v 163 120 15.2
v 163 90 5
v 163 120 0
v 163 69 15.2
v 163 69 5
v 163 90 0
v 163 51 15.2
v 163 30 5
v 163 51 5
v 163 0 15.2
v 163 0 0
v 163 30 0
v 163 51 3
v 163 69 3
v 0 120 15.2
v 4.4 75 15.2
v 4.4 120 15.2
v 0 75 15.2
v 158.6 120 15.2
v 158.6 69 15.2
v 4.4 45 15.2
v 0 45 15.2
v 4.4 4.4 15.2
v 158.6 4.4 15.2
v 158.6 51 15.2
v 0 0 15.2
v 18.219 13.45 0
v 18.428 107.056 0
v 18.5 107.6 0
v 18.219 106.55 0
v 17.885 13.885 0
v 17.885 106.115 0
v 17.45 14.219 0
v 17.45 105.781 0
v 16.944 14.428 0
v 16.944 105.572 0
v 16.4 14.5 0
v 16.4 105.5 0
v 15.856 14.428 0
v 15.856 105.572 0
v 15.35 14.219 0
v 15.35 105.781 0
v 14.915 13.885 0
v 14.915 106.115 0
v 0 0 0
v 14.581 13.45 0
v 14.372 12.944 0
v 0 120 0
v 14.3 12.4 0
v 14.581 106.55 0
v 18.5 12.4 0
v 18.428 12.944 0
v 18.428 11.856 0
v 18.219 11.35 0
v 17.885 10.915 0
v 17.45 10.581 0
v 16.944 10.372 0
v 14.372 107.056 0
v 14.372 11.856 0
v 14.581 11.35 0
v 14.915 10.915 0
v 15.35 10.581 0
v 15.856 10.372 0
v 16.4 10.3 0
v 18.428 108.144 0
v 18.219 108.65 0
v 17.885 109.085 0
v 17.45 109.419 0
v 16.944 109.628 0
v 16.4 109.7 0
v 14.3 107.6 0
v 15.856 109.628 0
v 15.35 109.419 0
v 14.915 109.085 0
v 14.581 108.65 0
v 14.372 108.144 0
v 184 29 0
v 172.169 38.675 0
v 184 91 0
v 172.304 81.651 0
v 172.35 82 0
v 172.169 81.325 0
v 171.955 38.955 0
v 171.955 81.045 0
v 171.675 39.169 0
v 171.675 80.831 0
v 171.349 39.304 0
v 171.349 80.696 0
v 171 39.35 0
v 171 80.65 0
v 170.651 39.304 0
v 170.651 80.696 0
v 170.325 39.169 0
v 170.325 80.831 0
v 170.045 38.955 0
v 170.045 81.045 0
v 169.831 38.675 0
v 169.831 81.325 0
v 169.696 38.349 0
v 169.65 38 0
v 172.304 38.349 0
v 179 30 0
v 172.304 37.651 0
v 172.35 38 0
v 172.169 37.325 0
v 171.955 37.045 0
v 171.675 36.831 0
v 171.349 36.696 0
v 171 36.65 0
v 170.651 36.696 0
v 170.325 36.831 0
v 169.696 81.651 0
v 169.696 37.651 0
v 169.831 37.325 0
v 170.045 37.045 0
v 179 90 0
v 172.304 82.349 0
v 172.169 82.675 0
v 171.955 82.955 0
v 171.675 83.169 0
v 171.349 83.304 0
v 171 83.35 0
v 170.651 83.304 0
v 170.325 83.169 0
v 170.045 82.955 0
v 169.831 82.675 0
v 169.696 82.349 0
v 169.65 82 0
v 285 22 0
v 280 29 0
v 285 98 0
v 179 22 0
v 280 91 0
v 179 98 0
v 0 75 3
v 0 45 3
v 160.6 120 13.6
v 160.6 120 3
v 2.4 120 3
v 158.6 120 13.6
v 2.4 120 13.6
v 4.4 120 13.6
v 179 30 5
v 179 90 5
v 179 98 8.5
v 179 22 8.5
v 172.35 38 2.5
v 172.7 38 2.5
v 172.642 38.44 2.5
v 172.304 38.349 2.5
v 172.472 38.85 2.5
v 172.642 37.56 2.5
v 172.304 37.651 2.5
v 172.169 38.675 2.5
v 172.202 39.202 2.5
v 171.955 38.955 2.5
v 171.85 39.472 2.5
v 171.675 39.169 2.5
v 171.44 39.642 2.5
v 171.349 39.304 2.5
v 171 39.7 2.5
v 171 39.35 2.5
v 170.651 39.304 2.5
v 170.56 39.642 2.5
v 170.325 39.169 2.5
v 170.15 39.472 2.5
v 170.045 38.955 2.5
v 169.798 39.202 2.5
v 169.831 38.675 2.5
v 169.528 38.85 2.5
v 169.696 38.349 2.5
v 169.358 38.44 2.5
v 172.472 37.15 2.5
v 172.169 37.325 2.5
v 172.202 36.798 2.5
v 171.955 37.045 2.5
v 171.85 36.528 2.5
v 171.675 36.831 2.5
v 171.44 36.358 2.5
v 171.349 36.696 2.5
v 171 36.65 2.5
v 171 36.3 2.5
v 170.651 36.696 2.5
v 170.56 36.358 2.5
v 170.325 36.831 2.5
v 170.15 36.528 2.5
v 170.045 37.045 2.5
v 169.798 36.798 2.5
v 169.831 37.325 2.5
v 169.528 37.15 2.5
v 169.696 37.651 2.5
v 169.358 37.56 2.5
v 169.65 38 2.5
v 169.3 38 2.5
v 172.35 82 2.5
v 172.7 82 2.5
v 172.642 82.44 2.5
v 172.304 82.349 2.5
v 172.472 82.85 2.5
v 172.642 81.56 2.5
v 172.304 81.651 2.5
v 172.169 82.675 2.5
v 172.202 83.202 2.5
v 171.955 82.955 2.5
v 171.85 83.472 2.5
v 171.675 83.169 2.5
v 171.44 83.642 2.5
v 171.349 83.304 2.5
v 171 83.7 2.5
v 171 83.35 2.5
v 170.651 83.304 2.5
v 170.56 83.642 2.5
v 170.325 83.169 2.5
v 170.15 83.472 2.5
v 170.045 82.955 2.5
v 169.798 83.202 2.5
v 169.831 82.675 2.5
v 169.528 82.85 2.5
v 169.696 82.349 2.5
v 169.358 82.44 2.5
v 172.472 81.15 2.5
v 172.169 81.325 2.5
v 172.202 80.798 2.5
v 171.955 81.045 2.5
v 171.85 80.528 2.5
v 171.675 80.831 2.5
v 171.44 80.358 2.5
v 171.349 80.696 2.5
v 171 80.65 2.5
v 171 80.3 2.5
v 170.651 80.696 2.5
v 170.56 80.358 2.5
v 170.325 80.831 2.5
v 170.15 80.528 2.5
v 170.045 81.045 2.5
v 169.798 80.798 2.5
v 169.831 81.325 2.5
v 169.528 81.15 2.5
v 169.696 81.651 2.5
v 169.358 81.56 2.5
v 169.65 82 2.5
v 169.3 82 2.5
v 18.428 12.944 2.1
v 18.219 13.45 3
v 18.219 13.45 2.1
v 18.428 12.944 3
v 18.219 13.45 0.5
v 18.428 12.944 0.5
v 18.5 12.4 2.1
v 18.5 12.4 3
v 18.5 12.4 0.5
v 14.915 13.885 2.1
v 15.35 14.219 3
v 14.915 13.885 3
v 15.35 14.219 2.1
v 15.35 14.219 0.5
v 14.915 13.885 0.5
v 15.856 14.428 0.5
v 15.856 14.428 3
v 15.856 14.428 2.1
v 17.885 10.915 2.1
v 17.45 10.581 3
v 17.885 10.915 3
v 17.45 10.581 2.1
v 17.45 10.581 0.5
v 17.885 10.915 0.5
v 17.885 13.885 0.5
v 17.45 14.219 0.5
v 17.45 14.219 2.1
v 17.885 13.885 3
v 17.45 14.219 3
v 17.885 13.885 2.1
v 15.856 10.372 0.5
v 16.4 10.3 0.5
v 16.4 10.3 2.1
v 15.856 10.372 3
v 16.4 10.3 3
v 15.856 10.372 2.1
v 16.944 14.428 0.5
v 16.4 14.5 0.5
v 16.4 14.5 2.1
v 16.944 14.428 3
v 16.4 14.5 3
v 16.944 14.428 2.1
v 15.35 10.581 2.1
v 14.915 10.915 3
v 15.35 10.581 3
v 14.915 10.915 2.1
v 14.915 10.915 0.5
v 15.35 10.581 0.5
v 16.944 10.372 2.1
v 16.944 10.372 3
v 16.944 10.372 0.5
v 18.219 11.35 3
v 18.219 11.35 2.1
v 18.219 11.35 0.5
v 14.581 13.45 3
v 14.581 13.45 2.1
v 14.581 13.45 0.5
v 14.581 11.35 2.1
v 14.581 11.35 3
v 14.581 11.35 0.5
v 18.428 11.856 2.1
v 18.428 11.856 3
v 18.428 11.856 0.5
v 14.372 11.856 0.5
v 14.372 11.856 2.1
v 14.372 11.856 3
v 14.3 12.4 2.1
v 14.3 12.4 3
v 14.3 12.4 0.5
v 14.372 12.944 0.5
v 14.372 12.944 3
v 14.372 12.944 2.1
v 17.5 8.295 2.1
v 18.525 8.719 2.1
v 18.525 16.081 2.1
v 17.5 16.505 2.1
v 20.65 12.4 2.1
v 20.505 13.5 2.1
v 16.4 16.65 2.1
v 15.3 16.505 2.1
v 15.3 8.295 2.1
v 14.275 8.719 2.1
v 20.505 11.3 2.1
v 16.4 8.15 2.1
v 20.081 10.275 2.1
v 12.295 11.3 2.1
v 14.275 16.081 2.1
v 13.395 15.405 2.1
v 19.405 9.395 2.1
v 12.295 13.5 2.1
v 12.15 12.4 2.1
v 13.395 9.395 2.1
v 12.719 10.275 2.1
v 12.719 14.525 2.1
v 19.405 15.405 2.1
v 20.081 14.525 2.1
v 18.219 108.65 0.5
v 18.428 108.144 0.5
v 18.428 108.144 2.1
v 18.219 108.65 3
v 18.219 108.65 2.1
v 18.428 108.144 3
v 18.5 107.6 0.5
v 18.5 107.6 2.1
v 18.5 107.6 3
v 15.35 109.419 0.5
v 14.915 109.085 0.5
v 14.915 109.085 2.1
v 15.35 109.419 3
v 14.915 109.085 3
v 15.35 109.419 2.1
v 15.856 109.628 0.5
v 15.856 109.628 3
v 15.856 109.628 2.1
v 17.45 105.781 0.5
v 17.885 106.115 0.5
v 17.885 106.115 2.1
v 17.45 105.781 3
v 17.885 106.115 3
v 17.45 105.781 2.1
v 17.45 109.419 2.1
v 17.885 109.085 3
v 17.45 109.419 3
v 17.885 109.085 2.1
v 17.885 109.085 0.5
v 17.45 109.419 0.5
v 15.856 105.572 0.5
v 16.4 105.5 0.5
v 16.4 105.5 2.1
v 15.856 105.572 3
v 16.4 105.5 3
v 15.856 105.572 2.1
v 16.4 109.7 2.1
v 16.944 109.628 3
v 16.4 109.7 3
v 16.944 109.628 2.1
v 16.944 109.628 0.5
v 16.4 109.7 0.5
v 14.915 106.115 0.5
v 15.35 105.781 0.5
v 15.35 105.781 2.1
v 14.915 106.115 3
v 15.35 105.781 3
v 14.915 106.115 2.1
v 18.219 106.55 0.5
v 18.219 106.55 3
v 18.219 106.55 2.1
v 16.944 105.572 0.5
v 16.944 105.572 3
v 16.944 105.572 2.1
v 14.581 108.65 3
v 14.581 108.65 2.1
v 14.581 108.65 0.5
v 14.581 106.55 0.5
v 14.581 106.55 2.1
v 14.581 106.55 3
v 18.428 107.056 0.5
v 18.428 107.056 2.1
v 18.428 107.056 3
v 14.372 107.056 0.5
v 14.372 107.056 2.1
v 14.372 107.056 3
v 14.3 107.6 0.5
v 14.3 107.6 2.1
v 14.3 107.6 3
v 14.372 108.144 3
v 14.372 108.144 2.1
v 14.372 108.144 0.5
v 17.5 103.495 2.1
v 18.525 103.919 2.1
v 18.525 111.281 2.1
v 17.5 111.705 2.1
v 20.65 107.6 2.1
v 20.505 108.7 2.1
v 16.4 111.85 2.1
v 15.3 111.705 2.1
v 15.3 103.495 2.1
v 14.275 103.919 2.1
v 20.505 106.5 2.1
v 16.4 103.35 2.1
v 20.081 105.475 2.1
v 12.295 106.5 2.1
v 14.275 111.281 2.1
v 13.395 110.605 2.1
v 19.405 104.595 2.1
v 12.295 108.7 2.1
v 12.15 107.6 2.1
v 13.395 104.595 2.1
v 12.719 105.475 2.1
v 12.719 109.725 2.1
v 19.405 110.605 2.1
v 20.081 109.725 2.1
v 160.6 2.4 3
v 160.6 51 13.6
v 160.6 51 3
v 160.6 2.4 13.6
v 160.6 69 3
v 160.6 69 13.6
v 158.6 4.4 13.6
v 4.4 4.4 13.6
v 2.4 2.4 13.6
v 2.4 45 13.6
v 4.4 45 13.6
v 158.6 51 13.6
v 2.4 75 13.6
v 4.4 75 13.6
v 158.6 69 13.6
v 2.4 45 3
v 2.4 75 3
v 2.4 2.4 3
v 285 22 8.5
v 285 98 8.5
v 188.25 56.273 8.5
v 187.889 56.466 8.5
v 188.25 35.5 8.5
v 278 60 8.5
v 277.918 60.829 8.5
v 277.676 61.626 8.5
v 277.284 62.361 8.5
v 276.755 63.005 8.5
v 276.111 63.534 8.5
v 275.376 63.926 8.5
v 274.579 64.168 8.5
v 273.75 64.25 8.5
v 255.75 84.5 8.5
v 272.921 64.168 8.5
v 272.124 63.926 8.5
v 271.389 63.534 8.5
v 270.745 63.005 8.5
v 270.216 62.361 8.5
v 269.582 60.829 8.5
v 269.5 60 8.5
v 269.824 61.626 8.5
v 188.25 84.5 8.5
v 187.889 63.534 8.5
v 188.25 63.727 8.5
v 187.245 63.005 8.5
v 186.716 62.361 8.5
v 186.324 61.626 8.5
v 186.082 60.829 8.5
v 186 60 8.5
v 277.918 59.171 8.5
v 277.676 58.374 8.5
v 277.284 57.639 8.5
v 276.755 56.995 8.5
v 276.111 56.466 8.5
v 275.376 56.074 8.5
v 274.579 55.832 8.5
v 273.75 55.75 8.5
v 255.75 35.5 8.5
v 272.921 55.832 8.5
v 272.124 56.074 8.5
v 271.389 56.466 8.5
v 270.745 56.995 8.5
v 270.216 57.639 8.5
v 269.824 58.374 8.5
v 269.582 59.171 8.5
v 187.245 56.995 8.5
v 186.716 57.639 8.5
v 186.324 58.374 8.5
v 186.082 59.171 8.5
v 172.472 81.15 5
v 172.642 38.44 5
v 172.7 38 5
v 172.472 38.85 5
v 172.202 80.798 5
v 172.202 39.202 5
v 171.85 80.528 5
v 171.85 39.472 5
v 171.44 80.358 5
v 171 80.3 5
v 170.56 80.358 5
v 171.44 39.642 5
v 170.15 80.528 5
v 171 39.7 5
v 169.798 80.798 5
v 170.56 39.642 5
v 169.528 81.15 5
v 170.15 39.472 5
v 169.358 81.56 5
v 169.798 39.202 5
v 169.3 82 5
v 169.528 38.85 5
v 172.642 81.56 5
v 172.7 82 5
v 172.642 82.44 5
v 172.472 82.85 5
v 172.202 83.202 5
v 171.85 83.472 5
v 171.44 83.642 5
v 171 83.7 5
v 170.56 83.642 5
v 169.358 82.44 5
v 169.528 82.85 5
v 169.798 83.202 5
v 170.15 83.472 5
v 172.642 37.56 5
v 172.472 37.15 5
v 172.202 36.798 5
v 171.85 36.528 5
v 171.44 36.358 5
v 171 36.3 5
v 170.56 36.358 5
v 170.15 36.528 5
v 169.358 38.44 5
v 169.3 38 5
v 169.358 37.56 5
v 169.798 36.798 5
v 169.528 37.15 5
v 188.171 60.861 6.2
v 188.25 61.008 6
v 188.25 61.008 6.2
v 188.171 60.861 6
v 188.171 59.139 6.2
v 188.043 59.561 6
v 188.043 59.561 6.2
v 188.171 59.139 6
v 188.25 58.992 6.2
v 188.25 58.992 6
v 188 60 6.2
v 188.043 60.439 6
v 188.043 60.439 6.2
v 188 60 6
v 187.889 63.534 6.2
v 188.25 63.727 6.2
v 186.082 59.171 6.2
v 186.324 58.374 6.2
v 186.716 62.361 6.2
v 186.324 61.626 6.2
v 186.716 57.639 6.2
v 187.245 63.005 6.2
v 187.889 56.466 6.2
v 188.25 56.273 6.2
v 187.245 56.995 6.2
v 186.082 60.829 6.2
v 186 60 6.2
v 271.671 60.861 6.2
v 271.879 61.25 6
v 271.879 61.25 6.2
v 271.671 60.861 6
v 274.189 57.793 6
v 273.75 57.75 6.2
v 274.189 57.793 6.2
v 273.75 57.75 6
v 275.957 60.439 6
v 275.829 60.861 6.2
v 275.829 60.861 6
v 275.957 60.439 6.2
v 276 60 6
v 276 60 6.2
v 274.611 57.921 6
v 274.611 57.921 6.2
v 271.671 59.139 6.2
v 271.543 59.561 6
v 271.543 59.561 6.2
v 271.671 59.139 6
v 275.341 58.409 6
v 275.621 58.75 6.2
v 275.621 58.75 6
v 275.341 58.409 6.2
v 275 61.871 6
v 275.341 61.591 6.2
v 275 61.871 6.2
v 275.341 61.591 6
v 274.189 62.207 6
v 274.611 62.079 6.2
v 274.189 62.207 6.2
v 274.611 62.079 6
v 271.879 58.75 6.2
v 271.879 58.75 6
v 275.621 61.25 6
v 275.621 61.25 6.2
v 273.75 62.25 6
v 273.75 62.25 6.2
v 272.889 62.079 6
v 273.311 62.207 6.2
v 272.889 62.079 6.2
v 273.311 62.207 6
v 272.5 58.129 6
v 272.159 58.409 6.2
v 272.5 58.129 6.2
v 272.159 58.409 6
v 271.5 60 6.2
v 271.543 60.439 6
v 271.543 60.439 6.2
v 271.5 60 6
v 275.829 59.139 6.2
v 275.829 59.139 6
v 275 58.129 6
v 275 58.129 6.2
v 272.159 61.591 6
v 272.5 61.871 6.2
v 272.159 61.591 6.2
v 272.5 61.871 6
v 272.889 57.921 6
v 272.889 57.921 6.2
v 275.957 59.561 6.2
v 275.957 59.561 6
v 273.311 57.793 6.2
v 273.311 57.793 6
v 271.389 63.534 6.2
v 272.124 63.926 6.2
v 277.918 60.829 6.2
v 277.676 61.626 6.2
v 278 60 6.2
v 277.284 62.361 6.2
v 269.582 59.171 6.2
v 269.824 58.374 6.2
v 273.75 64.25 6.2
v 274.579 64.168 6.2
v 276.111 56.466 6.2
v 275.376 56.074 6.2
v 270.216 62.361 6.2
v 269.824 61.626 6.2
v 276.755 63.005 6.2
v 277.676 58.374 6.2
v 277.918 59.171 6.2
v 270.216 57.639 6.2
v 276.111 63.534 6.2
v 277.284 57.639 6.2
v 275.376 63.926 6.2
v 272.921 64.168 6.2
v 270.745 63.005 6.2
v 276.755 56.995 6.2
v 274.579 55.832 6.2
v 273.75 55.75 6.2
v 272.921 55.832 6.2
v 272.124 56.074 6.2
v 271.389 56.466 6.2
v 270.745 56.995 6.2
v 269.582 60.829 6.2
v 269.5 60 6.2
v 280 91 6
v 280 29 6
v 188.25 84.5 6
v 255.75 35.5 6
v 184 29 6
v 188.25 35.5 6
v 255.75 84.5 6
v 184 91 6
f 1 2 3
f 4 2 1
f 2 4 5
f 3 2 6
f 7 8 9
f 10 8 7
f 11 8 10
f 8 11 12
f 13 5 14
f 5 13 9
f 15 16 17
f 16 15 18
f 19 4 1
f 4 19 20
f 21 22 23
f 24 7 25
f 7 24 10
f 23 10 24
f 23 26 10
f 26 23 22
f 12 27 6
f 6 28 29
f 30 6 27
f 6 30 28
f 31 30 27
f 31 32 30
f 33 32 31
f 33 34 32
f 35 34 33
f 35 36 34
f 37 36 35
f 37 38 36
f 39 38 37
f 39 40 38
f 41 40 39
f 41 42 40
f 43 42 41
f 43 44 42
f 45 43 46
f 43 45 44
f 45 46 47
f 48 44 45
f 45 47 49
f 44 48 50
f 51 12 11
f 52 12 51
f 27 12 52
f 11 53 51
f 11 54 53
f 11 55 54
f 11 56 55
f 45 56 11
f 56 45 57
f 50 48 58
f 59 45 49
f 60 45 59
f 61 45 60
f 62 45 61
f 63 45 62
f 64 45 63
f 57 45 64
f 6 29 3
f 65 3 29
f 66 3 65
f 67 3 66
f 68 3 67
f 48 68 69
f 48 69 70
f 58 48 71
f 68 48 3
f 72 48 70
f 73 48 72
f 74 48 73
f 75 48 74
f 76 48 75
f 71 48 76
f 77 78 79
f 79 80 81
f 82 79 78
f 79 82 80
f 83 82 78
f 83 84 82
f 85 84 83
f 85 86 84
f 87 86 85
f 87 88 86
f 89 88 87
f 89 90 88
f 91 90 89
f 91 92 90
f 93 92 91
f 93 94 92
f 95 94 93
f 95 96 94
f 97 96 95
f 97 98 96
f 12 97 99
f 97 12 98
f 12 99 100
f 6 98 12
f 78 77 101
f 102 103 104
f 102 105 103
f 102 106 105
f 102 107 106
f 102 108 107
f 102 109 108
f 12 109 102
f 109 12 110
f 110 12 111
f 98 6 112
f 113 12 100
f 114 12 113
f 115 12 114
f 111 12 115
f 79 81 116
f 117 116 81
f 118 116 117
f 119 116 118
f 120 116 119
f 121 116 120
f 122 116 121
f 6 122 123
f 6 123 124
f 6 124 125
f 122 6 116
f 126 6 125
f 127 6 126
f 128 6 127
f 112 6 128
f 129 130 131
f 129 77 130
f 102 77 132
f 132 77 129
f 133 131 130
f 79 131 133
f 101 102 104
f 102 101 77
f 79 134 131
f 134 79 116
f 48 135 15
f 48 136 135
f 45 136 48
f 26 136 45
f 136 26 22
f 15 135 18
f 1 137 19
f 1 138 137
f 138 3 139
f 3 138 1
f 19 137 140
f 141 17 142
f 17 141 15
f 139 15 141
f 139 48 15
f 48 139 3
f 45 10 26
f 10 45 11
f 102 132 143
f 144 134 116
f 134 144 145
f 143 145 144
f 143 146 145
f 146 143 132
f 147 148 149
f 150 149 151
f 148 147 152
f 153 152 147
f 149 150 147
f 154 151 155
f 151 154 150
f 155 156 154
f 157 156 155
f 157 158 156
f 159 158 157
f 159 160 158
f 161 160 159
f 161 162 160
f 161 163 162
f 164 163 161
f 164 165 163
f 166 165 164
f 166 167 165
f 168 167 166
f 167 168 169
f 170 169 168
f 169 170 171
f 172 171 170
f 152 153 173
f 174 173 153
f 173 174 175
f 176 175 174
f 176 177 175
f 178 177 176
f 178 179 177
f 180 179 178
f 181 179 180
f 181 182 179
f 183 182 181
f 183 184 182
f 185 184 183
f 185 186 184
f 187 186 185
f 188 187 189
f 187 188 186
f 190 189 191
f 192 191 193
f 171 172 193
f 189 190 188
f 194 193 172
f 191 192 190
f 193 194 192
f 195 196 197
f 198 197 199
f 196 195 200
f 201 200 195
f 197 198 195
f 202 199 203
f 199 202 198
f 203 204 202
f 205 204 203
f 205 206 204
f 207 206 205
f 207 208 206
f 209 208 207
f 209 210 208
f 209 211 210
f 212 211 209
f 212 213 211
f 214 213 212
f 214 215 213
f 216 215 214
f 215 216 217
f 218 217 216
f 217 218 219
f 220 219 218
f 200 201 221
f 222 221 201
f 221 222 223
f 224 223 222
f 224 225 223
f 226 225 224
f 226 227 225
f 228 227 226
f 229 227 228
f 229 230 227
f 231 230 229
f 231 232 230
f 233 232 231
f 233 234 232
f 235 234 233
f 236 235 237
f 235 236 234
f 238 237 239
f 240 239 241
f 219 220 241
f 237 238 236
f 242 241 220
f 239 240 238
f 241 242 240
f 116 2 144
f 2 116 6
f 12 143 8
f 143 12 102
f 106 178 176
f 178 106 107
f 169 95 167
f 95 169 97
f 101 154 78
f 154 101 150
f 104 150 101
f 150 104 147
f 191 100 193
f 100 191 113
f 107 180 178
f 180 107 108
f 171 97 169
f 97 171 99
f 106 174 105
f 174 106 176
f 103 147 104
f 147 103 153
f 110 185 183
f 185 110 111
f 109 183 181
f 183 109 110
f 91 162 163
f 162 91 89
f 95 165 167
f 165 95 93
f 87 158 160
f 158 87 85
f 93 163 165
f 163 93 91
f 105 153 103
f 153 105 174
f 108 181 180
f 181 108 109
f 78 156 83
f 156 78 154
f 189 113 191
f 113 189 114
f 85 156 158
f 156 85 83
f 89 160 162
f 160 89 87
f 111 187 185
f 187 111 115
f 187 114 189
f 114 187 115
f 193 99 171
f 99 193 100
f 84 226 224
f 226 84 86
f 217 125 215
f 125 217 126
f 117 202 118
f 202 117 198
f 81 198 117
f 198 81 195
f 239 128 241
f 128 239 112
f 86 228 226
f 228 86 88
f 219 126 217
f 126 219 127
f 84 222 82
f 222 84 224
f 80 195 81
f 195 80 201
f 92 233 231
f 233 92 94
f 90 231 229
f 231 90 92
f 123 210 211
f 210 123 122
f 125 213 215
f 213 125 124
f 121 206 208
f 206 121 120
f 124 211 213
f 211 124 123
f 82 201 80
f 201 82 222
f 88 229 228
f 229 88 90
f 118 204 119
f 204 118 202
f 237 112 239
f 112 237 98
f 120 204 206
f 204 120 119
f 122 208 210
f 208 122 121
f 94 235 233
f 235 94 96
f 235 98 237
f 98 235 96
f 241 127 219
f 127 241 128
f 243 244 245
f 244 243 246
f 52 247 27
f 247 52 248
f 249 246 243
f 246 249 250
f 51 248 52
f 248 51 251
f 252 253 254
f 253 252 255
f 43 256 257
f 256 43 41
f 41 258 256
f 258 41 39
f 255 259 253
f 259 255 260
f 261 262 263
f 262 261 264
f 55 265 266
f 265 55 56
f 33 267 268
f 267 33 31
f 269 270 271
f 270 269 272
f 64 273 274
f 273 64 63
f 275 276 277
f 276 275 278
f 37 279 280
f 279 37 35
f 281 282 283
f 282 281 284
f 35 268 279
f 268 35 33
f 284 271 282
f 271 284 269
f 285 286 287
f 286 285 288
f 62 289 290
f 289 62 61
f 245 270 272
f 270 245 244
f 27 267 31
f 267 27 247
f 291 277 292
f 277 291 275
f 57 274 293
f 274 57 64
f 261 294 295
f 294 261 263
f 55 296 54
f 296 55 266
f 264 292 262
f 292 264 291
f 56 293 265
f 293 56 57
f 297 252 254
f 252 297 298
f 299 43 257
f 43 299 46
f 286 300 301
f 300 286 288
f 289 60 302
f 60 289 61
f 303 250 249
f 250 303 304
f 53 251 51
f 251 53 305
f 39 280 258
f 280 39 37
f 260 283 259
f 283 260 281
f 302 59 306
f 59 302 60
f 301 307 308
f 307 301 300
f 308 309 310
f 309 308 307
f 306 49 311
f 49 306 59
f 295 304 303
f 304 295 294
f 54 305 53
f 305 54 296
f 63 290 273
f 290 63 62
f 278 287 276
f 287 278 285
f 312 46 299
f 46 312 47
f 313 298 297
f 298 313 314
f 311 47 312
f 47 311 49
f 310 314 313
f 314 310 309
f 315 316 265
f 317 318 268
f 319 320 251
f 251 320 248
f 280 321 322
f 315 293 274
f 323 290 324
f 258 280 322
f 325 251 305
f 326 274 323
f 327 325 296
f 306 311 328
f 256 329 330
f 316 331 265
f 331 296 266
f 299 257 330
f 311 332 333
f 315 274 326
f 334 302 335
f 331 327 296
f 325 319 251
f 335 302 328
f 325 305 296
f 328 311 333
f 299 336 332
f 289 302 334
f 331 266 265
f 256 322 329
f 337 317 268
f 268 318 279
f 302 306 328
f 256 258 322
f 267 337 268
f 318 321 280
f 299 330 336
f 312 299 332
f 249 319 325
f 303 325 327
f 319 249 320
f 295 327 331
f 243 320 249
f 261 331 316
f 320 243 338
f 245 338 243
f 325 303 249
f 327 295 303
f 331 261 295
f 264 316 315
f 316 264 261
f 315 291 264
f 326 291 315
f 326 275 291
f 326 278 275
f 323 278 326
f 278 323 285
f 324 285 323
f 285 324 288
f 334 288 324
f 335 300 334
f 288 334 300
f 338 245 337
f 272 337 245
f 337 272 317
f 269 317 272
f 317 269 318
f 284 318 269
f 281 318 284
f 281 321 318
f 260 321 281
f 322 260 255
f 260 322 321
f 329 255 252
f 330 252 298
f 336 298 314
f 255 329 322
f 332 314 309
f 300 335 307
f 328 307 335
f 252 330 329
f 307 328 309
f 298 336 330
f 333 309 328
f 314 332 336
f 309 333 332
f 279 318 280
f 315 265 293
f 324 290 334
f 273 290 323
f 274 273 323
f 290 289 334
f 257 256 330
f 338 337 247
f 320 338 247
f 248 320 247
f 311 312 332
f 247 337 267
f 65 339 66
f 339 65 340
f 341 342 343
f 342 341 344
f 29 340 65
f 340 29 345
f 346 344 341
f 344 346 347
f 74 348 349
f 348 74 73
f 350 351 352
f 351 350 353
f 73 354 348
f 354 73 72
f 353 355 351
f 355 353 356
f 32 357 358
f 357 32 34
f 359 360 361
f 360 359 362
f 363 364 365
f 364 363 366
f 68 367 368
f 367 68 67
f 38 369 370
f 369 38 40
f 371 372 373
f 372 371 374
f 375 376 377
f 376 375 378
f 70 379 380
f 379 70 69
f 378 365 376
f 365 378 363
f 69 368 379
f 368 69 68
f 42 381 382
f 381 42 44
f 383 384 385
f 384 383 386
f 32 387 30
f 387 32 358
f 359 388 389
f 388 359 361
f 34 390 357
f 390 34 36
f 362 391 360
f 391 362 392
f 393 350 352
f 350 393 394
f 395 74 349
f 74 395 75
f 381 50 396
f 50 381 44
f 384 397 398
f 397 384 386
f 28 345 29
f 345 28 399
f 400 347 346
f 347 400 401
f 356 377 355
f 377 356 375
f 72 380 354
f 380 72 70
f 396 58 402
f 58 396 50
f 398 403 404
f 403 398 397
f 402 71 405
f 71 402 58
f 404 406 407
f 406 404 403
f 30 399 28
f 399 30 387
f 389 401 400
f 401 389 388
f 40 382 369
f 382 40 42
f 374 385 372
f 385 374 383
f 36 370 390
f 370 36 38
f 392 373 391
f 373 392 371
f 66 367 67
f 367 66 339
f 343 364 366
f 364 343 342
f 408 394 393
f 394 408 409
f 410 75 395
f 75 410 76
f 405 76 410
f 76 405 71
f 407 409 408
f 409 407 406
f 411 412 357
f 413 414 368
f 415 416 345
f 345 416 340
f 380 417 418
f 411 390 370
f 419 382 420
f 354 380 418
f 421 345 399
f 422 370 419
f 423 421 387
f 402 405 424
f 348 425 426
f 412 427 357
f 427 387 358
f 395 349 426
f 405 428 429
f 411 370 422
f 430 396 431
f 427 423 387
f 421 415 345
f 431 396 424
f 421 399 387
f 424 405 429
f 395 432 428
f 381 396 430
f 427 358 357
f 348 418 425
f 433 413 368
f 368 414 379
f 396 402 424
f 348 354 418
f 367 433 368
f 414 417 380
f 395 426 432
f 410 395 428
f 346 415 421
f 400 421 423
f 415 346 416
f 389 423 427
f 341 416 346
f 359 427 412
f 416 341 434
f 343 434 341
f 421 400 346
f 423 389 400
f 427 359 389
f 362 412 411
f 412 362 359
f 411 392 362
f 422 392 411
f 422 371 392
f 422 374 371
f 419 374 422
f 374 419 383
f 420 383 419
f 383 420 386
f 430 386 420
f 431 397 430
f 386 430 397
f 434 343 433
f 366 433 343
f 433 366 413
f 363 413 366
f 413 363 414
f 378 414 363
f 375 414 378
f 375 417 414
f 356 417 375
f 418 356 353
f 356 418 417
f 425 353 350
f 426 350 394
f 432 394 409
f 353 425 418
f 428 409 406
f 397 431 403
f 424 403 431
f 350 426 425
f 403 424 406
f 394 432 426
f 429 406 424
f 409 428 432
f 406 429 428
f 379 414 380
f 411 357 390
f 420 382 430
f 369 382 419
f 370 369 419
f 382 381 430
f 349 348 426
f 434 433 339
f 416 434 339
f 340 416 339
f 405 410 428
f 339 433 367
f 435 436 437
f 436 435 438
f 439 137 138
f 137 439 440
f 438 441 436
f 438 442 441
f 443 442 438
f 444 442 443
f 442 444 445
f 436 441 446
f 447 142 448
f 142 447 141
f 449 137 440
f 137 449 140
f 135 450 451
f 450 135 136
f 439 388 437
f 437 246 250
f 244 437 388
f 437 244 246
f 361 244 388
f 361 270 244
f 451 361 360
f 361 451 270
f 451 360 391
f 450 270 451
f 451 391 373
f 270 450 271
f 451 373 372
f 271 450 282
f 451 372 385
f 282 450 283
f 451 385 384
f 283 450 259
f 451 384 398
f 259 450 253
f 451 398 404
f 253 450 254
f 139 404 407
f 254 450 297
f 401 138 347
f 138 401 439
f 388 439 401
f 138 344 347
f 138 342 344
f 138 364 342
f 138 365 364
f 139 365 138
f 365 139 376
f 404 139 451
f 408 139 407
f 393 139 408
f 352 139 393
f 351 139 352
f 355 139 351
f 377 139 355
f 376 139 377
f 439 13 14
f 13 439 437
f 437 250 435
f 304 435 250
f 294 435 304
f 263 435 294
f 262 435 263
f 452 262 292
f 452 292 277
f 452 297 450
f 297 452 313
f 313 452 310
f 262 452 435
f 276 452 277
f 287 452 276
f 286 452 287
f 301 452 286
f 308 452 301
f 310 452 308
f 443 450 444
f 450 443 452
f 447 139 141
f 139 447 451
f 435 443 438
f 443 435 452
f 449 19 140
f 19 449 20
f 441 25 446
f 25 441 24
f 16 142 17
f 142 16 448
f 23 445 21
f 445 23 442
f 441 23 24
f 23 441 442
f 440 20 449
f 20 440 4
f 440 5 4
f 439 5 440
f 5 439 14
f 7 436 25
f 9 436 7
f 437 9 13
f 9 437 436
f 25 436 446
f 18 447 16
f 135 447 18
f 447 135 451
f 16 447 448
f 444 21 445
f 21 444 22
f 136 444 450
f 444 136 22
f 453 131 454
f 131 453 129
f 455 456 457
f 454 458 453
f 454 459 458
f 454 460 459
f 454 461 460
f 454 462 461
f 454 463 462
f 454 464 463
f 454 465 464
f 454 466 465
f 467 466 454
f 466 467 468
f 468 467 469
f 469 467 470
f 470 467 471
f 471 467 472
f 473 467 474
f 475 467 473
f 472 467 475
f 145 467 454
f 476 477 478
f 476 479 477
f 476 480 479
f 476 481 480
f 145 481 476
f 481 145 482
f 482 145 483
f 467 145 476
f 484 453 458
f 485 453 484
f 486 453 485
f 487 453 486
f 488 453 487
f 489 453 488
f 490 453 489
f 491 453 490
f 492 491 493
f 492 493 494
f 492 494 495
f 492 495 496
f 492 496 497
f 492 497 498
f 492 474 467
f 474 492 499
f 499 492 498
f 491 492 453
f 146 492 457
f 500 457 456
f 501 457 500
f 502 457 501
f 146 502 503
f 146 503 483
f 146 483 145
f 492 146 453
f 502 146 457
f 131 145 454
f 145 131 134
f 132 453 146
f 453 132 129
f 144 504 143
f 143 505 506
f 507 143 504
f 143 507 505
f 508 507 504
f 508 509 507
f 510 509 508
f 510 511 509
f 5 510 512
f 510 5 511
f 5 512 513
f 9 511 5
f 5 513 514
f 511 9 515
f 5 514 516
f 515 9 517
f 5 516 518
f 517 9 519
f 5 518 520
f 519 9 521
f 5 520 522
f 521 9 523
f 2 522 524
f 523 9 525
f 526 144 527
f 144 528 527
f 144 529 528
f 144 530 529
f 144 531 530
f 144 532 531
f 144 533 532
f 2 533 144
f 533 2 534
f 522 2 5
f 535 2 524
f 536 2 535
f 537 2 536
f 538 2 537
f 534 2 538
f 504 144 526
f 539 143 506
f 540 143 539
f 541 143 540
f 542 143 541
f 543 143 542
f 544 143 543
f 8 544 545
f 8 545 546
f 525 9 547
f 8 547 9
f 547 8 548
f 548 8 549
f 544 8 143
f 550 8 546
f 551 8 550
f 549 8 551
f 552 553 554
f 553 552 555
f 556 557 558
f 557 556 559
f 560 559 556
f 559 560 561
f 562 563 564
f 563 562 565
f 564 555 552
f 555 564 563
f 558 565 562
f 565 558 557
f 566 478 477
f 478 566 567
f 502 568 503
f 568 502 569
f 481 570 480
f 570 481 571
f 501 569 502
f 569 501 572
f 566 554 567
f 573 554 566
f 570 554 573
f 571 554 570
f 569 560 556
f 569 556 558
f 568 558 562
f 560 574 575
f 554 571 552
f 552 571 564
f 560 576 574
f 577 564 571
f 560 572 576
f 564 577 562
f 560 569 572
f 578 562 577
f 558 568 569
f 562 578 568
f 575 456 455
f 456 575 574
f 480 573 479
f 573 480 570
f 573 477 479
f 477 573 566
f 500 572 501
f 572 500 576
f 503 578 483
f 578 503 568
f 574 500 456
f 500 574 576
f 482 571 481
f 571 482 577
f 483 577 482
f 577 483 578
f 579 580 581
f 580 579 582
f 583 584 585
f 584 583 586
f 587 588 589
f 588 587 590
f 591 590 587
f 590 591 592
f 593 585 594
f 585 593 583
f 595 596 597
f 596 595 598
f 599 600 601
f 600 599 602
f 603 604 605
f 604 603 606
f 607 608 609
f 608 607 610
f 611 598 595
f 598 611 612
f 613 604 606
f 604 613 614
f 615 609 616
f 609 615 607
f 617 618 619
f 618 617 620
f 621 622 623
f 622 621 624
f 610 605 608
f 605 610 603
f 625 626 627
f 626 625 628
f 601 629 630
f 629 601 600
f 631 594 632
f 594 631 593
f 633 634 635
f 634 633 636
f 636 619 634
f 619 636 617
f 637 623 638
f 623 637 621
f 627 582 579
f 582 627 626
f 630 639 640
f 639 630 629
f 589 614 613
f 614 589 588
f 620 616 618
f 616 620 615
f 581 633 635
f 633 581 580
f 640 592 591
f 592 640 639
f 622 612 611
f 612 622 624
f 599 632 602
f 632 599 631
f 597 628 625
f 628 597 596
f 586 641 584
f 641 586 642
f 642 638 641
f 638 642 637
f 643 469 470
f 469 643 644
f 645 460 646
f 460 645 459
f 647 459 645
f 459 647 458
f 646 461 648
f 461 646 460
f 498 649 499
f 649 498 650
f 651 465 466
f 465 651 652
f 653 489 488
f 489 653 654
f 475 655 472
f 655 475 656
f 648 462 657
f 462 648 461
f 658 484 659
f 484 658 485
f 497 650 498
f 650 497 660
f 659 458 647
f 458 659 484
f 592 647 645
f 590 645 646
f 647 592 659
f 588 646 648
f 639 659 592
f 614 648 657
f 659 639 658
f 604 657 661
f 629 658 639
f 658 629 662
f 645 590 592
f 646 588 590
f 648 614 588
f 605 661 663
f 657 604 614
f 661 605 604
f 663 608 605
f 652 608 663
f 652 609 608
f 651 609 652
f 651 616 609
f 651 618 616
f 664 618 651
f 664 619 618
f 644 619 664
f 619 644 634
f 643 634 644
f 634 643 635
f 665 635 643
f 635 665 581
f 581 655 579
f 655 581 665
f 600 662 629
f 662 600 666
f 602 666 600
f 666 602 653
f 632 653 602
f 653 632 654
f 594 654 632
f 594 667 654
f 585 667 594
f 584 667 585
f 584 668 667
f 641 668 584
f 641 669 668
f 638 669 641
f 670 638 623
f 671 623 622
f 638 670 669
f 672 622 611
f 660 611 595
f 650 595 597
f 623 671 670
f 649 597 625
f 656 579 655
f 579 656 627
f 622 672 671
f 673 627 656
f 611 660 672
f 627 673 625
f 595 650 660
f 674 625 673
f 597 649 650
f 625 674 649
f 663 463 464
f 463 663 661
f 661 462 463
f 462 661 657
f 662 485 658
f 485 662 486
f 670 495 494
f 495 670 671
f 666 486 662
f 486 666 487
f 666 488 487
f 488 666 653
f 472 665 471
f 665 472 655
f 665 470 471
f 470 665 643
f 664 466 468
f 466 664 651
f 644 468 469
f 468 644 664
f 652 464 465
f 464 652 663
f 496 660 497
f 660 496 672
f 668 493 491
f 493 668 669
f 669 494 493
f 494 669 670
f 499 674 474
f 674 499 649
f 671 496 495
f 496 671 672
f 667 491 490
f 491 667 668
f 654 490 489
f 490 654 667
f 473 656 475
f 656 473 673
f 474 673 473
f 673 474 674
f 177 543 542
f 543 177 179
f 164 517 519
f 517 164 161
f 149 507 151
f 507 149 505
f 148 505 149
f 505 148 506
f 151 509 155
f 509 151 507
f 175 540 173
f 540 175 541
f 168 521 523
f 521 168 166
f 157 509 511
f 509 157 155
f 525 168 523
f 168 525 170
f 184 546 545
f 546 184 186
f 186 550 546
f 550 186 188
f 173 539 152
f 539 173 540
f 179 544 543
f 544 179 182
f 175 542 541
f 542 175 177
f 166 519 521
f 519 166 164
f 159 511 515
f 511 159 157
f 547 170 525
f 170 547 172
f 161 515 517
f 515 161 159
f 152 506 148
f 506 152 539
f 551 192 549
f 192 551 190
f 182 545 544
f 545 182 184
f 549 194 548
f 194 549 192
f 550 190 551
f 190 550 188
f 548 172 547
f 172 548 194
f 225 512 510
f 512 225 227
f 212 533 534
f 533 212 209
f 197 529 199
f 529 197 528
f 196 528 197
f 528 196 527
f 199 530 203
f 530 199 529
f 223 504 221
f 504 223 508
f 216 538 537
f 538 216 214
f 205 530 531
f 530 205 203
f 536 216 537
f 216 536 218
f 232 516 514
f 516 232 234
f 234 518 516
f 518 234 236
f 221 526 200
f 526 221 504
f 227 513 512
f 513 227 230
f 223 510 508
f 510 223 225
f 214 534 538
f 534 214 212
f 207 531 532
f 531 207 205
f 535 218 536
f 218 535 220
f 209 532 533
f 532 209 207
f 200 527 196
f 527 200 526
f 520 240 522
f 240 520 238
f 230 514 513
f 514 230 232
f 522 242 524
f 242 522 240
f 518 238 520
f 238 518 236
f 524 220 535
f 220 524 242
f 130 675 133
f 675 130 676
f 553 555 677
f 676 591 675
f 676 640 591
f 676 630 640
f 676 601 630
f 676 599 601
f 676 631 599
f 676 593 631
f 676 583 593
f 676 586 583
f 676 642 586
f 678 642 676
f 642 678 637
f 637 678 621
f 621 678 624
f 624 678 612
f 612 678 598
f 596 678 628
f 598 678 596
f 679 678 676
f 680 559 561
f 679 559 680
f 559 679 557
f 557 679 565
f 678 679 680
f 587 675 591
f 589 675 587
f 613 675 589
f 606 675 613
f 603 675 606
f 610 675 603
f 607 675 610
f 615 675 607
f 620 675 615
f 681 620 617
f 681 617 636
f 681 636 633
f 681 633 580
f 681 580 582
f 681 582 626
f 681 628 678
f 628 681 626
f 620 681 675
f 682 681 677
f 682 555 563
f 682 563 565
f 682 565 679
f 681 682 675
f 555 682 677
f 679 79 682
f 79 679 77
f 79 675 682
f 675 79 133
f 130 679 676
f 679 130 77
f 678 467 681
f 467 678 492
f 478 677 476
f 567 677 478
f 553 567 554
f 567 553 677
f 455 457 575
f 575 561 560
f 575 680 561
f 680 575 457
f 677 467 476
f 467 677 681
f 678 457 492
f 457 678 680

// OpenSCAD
// Supporto a muro per Kobo Glo (N613) + adattatore per scatola 503 / BTicino Living Light
// Orientamento: landscape, micro-USB sul lato DESTRO, tasto power sul lato SINISTRO.
// Sistema di coordinate: x = destra, y = su, z = esce dal muro. Unità: mm.
//
// Due pezzi stampabili (ciascuno entra in un piatto 220x220):
//   tray()    = vano per il Kobo (aperto in alto: il Kobo si infila dall'alto)
//   adapter() = piastra che si avvita alla 503 sopra il supporto Living Light
// I due pezzi si uniscono con 2 viti M3x10 attraverso le linguette sovrapposte.
//
// !! Valori marcati [VERIFICARE] sono stime: misurali sul tuo hardware prima di stampare.

part = "assembly";   // "assembly" | "tray" | "adapter"

/* ---- Kobo Glo (fonti: MobileRead/Wikipedia 114 x 157 x 10) ---- */
kobo_w = 157;        // lato lungo (landscape)
kobo_h = 114;        // lato corto
kobo_t = 10;         // spessore
clr    = 0.6;        // gioco per lato
lip    = 2.0;        // sovrapposizione del bordo frontale: MAI di piu', sotto ci sono i sensori IR
usb_y     = 0;       // [VERIFICARE] offset verticale porta USB rispetto al centro (+ = su)
usb_w     = 18;      // larghezza apertura per spinotto (consigliato spinotto a 90 gradi)
power_y   = 0;       // [VERIFICARE] offset verticale tasto power rispetto al centro, lato sinistro
power_w   = 30;      // apertura per raggiungere il tasto

/* ---- Struttura ---- */
wall   = 2.4;        // pareti
back   = 3.0;        // fondo vano
lip_t  = 1.6;        // spessore del bordo frontale
tab_l  = 16;         // lunghezza linguette di unione
tab_t  = 2.5;        // spessore di ciascuna linguetta

/* ---- Scatola 503 / Living Light ---- */
hole_pitch = 83.5;   // interasse fori 503 (standard)
ad_w   = 106;        // [VERIFICARE] larghezza piastra adattatore
ad_h   = 76;         // [VERIFICARE] altezza piastra adattatore
sup_t  = 6;          // [VERIFICARE] spessore supporto Living Light che entra nella cava posteriore
sup_w  = 96;         // [VERIFICARE] ingombro supporto (cava posteriore)
sup_h  = 62;         // [VERIFICARE]
win_w  = 67.5;       // [VERIFICARE] finestra moduli (3 moduli)
win_h  = 49;         // [VERIFICARE]
win_dx = -10;        // spostamento finestra verso il Kobo (cavo corto)
screw_d = 4.5;       // asola per viti 503
head_d  = 8.5;

tw = kobo_w + 2*clr + 2*wall;
th = kobo_h + 2*clr + 2*wall;
pd = kobo_t + clr;
tdepth = back + pd + lip_t;
ad_t = sup_t + 2.5;

module tray() {
  difference() {
    union() {
      cube([tw, th, tdepth]);
      // linguetta di unione (lato muro)
      translate([tw, th/2-30, 0]) cube([tab_l, 60, tab_t]);
    }
    // vano Kobo, aperto in alto
    translate([wall, wall, back]) cube([kobo_w+2*clr, kobo_h+2*clr+wall+1, pd]);
    // finestra frontale (bordo che trattiene solo 'lip' mm)
    translate([wall+lip, wall+lip, back+pd-0.01]) cube([kobo_w+2*clr-2*lip, th, lip_t+1]);
    // apertura USB (destra) e tasto power (sinistra)
    translate([tw-wall-lip, th/2+usb_y-usb_w/2, back]) cube([wall+lip+1, usb_w, tdepth]);
    translate([-1, th/2+power_y-power_w/2, back]) cube([wall+lip+1, power_w, tdepth]);
    // viti M3 per unione
    for (s=[-1,1]) translate([tw+tab_l/2, th/2+s*22, -1]) cylinder(d=2.7, h=tab_t+2, $fn=24);
    // 2 fori opzionali per fissare il vano al muro (tassello)
    for (s=[-1,1]) translate([wall+14, th/2+s*(th/2-wall-10), -1]) {
      cylinder(d=4.2, h=back+2, $fn=24);
      translate([0,0,back-1.5]) cylinder(d1=4.2,d2=8.5,h=1.6,$fn=24);
    }
  }
}

module adapter() {
  difference() {
    union() {
      translate([tab_l, 0, 0]) cube([ad_w, ad_h, ad_t]);
      // linguetta sovrapposta (sopra quella del vano)
      translate([0, ad_h/2-30, tab_t]) cube([tab_l+1, 60, tab_t]);
    }
    // cava posteriore per il supporto Living Light
    translate([tab_l+(ad_w-sup_w)/2, (ad_h-sup_h)/2, -1]) cube([sup_w, sup_h, sup_t+1]);
    // finestra per i moduli
    translate([tab_l+(ad_w-win_w)/2+win_dx, (ad_h-win_h)/2, -1]) cube([win_w, win_h, ad_t+2]);
    // asole viti 503 con svasatura
    for (s=[-1,1]) translate([tab_l+ad_w/2+s*hole_pitch/2, ad_h/2, -1]) {
      cylinder(d=screw_d, h=ad_t+2, $fn=32);
      translate([0,0,sup_t+1.2]) cylinder(d=head_d, h=ad_t, $fn=32);
    }
    // viti M3 unione
    for (s=[-1,1]) translate([tab_l/2, ad_h/2+s*22, tab_t-1]) cylinder(d=3.4, h=tab_t+2, $fn=24);
  }
}

if (part == "tray") tray();
else if (part == "adapter") adapter();
else {
  color("#cfd8dc") tray();
  color("#90caf9") translate([tw, th/2-ad_h/2, 0]) adapter();
  // sagoma Kobo (solo anteprima)
  %translate([wall+clr, wall+clr, back]) cube([kobo_w, kobo_h, kobo_t]);
}
